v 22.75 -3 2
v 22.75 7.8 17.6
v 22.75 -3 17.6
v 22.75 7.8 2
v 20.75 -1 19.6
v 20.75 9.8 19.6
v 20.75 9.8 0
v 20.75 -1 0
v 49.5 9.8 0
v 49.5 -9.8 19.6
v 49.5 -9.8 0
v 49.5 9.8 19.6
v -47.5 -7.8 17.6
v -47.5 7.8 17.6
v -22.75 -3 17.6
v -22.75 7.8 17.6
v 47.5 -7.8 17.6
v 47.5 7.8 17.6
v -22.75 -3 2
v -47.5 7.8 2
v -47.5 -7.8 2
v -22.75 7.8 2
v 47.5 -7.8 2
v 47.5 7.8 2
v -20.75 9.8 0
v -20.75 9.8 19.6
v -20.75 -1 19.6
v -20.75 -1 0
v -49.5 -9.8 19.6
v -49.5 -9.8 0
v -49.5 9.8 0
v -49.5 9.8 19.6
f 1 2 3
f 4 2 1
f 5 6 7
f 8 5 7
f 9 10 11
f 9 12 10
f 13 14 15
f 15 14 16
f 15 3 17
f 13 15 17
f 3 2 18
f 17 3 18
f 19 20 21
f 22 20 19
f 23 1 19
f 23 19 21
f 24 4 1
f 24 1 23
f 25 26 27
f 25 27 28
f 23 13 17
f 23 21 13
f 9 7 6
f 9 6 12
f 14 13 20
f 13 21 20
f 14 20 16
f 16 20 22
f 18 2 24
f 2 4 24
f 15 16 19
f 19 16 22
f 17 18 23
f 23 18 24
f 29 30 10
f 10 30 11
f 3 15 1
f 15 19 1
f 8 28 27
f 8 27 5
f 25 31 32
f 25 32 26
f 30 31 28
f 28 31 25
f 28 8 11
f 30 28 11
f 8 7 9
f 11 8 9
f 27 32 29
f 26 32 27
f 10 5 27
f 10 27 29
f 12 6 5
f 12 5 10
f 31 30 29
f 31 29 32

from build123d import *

# Parameters (mm, degrees)
SKETCH_1_W          = 99
SKETCH_1_H          = 19.6
EXTRUDE_1_DEPTH     = 19.6
SKETCH_3_W          = 41.5
SKETCH_3_H          = 19.6
CUT_EXTRUDE_1_DEPTH = 10.8
SKETCH_4_W          = 19.6
SKETCH_4_H          = 19.6
EXTRUDE_2_DEPTH     = 0.5
SHELL_1_T           = -2
SKETCH_6_W          = 15.6
SKETCH_6_H          = 15.6
EXTRUDE_3_DEPTH     = 2


with BuildPart() as part:
    # 草圖1 → 填料-伸長1 (new body)
    with BuildSketch(Plane.XY):
        Rectangle(SKETCH_1_W, SKETCH_1_H)
    extrude(amount=EXTRUDE_1_DEPTH)

    # 草圖3 → 除料-伸長1 (cut)
    with BuildSketch(Plane(origin=(0, 9.8, 0), x_dir=(1, 0, 0), z_dir=(0, 1, 0))):
        with Locations((0, -9.8)):
            Rectangle(SKETCH_3_W, SKETCH_3_H)
    extrude(amount=-CUT_EXTRUDE_1_DEPTH, mode=Mode.SUBTRACT)

    # 草圖4 → 填料-伸長2 (add)
    with BuildSketch(Plane(origin=(49.5, 0, 0), x_dir=(0, 0, -1), z_dir=(1, 0, 0))):
        with Locations((-9.8, 0)):
            Rectangle(SKETCH_4_W, SKETCH_4_H)
    extrude(amount=-EXTRUDE_2_DEPTH)

    # 薄殼1
    shell_1_openings = [part.faces().sort_by_distance(p)[0] for p in [
        (49.5, 0, 9.8),
    ]]
    offset(amount=SHELL_1_T, openings=shell_1_openings, kind=Kind.INTERSECTION)

    # 草圖6 → 填料-伸長3 (add)
    with BuildSketch(Plane(origin=(49.5, 0, 0), x_dir=(0, 0, -1), z_dir=(1, 0, 0))):
        with Locations((-9.8, 0)):
            Rectangle(SKETCH_6_W, SKETCH_6_H)
    extrude(amount=-EXTRUDE_3_DEPTH)


solid = part.part
